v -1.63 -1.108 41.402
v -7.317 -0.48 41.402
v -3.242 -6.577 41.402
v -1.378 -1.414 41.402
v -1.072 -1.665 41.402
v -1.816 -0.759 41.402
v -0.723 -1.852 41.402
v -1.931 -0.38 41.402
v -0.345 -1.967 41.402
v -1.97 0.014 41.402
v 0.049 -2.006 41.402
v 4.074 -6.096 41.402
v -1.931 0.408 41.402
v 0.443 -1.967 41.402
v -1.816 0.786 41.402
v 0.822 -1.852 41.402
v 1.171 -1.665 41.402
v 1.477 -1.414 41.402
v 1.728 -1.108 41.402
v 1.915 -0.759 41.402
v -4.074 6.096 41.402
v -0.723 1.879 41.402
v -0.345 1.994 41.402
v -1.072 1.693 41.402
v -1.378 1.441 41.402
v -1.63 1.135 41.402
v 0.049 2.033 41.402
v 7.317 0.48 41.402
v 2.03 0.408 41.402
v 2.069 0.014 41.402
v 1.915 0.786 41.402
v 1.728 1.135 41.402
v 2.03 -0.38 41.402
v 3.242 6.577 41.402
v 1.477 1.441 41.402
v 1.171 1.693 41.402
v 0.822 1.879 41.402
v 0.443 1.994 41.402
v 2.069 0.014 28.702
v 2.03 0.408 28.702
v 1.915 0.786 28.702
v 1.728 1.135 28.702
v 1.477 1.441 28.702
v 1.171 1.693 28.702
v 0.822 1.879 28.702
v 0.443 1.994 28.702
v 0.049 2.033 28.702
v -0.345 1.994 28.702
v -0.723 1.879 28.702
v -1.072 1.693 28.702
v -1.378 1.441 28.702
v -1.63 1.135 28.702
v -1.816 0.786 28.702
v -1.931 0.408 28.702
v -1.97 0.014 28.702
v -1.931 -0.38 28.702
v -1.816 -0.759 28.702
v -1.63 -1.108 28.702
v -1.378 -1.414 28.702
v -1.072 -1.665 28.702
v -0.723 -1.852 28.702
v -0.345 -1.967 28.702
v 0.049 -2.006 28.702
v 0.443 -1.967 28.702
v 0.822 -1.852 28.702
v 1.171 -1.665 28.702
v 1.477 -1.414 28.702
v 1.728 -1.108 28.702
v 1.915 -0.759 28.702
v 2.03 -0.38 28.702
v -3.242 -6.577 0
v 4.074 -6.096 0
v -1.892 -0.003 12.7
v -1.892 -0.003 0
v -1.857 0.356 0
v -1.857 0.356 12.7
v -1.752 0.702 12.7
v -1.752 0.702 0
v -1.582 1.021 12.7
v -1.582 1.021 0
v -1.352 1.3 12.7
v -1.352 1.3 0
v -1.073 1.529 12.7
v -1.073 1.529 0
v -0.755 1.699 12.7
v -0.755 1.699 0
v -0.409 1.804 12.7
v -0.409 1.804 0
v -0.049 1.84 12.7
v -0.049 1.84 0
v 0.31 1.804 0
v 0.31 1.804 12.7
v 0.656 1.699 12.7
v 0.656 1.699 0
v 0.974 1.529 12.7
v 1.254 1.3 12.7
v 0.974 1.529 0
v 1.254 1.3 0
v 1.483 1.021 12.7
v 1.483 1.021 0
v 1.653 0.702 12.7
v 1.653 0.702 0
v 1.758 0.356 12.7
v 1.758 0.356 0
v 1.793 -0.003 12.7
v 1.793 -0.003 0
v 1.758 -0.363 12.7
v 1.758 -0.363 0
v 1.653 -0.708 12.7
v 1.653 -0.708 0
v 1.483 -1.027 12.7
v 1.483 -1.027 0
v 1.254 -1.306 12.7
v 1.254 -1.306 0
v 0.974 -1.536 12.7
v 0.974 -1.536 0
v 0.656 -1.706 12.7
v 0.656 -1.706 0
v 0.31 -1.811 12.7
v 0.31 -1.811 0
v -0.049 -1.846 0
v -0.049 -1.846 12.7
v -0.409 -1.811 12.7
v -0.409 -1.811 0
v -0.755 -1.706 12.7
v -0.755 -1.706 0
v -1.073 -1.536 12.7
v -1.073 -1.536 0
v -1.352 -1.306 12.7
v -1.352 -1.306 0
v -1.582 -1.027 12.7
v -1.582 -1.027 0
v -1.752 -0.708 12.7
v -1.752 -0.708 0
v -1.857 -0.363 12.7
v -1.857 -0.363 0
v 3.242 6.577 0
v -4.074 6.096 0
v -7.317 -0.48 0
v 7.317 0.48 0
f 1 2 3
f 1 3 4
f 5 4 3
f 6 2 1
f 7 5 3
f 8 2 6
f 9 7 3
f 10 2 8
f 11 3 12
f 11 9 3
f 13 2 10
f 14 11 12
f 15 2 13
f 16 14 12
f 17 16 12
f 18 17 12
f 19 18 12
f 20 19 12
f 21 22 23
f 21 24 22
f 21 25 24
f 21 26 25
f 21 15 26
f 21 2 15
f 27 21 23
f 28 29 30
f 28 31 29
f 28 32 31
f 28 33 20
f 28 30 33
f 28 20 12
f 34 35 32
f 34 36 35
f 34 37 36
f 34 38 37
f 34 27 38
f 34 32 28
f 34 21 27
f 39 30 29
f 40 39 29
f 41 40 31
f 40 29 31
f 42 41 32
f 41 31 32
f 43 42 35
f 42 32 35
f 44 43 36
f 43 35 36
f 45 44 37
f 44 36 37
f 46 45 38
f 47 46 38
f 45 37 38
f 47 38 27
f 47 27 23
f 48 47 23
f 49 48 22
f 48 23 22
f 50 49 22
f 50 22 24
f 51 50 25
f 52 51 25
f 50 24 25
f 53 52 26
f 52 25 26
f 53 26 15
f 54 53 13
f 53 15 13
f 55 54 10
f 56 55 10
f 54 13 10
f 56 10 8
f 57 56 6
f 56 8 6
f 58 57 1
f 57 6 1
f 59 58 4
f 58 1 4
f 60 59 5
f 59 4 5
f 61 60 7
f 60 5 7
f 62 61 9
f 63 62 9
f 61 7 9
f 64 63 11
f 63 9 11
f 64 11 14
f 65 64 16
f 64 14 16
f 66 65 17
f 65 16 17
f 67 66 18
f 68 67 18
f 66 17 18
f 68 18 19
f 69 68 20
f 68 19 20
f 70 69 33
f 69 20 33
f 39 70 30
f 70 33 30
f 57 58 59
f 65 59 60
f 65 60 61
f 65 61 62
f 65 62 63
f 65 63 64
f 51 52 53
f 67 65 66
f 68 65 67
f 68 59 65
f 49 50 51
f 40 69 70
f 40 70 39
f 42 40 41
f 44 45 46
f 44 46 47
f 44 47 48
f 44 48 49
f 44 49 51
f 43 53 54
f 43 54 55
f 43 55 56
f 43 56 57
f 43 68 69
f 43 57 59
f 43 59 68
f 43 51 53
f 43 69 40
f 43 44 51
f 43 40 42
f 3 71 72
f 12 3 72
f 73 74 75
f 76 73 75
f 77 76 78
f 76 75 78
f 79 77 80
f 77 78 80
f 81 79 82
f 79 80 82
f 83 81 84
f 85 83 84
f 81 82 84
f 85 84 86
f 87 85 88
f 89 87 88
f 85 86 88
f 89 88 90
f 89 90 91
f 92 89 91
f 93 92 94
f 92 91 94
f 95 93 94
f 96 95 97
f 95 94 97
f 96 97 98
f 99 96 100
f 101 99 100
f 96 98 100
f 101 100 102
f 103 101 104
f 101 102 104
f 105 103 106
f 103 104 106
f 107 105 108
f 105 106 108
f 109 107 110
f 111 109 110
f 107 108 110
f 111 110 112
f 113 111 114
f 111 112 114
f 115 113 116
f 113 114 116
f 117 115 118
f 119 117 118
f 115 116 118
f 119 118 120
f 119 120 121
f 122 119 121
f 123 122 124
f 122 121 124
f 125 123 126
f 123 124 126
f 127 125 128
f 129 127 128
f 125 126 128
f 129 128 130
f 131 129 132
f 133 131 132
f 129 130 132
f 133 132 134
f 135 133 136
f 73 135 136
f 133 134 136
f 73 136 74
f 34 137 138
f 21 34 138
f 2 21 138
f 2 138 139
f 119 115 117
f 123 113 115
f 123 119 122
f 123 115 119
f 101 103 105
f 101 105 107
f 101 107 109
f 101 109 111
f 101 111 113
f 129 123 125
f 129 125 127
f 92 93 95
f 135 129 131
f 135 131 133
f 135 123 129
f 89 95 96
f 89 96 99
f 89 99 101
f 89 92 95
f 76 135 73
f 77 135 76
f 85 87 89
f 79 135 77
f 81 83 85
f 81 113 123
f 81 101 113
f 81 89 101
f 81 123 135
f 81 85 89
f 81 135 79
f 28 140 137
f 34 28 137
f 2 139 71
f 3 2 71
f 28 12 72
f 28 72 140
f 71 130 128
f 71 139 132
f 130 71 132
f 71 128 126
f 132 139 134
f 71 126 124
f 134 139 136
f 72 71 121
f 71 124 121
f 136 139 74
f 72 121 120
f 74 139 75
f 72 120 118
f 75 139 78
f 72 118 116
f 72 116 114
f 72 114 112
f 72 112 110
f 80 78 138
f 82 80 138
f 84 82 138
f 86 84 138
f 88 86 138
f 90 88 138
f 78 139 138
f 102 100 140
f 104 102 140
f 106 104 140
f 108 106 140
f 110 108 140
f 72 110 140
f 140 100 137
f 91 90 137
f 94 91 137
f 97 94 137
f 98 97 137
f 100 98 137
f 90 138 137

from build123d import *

# Parameters (mm, degrees)
BOSS_EXTRUDE1_DEPTH = 41.402
SKETCH2_R           = 2.0193
CUT_EXTRUDE2_DEPTH  = 12.7
SKETCH3_R           = 1.842835094
CUT_EXTRUDE7_DEPTH  = 12.7


with BuildPart() as part:
    # Sketch1 → Boss-Extrude1 (new body)
    with BuildSketch(Plane.XY):
        Polygon((3.242368481, 6.576502107), (-4.074233653, 6.096224526), (-7.316602133, -0.480277581), (-3.242368481, -6.576502107), (4.074233653, -6.096224526), (7.316602133, 0.480277581), align=None)
    extrude(amount=BOSS_EXTRUDE1_DEPTH)

    # Sketch2 → Cut-Extrude2 (cut)
    with BuildSketch(Plane.XY.offset(41.402)):
        with Locations((0.049397867, 0.013636683)):
            Circle(SKETCH2_R)
    extrude(amount=-CUT_EXTRUDE2_DEPTH, mode=Mode.SUBTRACT)

    # Sketch3 → Cut-Extrude7 (cut)
    with BuildSketch(Plane(origin=(0, 0, 0), x_dir=(-1, 0, 0), z_dir=(0, 0, -1))):
        with Locations((0.049397867, -0.003242583)):
            Circle(SKETCH3_R)
    extrude(amount=-CUT_EXTRUDE7_DEPTH, mode=Mode.SUBTRACT)


solid = part.part
